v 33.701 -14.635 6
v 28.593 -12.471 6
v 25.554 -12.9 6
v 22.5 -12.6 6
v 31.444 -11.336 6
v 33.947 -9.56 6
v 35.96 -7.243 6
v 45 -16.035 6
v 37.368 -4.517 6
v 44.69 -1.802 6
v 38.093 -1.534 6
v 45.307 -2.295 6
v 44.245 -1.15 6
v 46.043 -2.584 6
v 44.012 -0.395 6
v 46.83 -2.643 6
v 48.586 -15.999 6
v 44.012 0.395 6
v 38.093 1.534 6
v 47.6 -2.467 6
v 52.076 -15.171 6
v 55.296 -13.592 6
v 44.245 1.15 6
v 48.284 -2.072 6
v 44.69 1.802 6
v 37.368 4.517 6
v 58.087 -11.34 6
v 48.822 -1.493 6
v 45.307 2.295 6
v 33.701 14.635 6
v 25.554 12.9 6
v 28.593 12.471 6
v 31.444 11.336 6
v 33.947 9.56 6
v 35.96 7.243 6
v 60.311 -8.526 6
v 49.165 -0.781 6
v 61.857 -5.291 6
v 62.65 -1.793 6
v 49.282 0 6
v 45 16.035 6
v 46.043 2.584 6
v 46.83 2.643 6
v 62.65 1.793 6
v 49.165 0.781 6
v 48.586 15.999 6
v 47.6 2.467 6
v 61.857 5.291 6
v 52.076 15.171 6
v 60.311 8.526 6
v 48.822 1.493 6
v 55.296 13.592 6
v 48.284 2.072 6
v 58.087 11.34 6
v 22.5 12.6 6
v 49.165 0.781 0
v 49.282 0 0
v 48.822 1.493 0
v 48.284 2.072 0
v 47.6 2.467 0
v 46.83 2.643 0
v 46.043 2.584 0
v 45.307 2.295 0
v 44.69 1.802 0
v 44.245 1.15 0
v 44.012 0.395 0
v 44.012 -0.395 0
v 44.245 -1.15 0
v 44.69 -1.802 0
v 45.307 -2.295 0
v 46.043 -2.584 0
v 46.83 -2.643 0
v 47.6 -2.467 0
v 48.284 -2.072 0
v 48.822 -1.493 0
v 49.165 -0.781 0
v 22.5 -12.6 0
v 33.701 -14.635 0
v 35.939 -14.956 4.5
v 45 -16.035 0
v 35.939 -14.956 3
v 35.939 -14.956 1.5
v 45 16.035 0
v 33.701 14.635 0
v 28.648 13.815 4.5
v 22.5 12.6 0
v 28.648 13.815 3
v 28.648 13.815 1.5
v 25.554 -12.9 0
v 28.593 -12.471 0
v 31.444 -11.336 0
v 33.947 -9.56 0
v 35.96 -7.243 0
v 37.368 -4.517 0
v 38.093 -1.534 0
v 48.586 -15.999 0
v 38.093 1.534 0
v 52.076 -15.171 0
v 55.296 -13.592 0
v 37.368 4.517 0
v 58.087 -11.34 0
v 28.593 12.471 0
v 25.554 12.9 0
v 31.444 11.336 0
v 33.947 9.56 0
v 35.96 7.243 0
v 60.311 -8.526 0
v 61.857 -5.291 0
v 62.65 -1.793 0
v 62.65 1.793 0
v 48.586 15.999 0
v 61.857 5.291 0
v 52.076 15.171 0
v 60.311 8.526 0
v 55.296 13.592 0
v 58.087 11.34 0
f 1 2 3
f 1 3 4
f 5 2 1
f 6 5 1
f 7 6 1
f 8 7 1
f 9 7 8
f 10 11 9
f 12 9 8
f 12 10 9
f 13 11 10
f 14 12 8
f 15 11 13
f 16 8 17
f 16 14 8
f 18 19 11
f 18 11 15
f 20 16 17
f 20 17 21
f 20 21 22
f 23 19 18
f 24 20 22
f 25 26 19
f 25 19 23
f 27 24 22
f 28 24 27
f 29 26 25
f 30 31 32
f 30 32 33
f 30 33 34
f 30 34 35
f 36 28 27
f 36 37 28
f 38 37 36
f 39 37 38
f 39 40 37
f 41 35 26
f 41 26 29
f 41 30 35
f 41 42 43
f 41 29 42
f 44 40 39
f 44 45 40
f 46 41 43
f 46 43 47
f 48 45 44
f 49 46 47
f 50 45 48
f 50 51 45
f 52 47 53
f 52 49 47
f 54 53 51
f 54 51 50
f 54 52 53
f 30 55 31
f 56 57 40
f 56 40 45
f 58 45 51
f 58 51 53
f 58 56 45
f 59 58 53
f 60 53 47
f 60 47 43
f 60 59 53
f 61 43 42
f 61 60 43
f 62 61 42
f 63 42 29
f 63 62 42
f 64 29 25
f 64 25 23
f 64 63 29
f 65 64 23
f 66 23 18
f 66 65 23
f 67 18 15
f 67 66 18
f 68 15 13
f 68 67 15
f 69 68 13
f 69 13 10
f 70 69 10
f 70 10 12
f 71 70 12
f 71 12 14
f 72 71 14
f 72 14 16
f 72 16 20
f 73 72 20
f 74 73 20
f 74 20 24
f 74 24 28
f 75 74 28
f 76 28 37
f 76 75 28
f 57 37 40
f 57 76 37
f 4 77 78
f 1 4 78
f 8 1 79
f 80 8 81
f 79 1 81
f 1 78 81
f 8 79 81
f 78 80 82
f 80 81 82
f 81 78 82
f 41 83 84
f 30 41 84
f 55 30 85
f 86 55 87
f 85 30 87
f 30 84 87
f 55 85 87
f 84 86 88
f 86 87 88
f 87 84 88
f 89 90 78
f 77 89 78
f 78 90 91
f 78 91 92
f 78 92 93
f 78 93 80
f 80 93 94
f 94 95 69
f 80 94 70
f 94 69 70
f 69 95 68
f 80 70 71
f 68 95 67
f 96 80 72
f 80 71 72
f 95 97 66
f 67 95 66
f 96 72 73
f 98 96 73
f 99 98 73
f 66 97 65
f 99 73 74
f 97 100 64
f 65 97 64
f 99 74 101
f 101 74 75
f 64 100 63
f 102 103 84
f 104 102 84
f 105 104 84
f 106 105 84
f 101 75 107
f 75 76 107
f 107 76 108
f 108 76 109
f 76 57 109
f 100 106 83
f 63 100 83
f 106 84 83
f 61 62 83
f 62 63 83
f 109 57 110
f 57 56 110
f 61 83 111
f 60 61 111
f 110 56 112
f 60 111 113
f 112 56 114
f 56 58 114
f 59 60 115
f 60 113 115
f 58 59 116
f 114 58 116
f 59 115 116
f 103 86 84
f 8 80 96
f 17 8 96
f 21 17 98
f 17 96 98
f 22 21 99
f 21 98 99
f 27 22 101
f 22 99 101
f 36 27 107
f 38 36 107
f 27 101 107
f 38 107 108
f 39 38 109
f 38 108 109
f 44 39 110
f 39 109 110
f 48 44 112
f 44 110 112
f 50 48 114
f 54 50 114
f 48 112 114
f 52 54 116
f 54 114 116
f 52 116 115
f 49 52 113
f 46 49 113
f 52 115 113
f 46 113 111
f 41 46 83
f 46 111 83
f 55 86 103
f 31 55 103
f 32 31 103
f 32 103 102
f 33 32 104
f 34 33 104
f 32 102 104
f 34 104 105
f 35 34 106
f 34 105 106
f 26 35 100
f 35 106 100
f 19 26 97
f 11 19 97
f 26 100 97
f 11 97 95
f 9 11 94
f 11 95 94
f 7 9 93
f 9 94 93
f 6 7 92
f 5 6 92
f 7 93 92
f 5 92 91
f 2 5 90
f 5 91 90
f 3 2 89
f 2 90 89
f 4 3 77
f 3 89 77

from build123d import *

# Parameters (mm, degrees)
SKETCH2_R           = 2.65
BOSS_EXTRUDE2_DEPTH = 6


with BuildPart() as part:
    # Sketch2 → Boss-Extrude2 (new body)
    with BuildSketch(Plane.XY):
        with BuildLine():
            add(Edge.make_bspline(
                [(45, 16.035396523), (44.644632939, 15.999223801), (41.619048326, 15.685620583), (36.155474951, 15.030554758), (29.005619164, 13.923317691), (24.539912926, 13.049943774), (22.5, 12.599580353)],
                knots=[0.418410632, 0.418410632, 0.418410632, 0.418410632, 0.420162443, 0.433328265, 0.445393603, 0.455638041, 0.455638041, 0.455638041, 0.455638041], degree=3))
            ThreePointArc((22.5, 12.599580353), (38.184673742, 0), (22.5, -12.599580353))
            add(Edge.make_bspline(
                [(22.5, -12.599580353), (24.539912926, -13.049943774), (29.005619164, -13.923317691), (36.155474951, -15.030554758), (41.619048326, -15.685620583), (44.644632939, -15.999223801), (45, -16.035396523)],
                knots=[0.544361959, 0.544361959, 0.544361959, 0.544361959, 0.554606397, 0.566671735, 0.579837557, 0.581589368, 0.581589368, 0.581589368, 0.581589368], degree=3))
            ThreePointArc((45, -16.035396523), (62.750493933, 0), (45, 16.035396523))
        make_face()
        with Locations((46.632238895, 0)):
            Circle(SKETCH2_R, mode=Mode.SUBTRACT)
    extrude(amount=BOSS_EXTRUDE2_DEPTH)


solid = part.part
